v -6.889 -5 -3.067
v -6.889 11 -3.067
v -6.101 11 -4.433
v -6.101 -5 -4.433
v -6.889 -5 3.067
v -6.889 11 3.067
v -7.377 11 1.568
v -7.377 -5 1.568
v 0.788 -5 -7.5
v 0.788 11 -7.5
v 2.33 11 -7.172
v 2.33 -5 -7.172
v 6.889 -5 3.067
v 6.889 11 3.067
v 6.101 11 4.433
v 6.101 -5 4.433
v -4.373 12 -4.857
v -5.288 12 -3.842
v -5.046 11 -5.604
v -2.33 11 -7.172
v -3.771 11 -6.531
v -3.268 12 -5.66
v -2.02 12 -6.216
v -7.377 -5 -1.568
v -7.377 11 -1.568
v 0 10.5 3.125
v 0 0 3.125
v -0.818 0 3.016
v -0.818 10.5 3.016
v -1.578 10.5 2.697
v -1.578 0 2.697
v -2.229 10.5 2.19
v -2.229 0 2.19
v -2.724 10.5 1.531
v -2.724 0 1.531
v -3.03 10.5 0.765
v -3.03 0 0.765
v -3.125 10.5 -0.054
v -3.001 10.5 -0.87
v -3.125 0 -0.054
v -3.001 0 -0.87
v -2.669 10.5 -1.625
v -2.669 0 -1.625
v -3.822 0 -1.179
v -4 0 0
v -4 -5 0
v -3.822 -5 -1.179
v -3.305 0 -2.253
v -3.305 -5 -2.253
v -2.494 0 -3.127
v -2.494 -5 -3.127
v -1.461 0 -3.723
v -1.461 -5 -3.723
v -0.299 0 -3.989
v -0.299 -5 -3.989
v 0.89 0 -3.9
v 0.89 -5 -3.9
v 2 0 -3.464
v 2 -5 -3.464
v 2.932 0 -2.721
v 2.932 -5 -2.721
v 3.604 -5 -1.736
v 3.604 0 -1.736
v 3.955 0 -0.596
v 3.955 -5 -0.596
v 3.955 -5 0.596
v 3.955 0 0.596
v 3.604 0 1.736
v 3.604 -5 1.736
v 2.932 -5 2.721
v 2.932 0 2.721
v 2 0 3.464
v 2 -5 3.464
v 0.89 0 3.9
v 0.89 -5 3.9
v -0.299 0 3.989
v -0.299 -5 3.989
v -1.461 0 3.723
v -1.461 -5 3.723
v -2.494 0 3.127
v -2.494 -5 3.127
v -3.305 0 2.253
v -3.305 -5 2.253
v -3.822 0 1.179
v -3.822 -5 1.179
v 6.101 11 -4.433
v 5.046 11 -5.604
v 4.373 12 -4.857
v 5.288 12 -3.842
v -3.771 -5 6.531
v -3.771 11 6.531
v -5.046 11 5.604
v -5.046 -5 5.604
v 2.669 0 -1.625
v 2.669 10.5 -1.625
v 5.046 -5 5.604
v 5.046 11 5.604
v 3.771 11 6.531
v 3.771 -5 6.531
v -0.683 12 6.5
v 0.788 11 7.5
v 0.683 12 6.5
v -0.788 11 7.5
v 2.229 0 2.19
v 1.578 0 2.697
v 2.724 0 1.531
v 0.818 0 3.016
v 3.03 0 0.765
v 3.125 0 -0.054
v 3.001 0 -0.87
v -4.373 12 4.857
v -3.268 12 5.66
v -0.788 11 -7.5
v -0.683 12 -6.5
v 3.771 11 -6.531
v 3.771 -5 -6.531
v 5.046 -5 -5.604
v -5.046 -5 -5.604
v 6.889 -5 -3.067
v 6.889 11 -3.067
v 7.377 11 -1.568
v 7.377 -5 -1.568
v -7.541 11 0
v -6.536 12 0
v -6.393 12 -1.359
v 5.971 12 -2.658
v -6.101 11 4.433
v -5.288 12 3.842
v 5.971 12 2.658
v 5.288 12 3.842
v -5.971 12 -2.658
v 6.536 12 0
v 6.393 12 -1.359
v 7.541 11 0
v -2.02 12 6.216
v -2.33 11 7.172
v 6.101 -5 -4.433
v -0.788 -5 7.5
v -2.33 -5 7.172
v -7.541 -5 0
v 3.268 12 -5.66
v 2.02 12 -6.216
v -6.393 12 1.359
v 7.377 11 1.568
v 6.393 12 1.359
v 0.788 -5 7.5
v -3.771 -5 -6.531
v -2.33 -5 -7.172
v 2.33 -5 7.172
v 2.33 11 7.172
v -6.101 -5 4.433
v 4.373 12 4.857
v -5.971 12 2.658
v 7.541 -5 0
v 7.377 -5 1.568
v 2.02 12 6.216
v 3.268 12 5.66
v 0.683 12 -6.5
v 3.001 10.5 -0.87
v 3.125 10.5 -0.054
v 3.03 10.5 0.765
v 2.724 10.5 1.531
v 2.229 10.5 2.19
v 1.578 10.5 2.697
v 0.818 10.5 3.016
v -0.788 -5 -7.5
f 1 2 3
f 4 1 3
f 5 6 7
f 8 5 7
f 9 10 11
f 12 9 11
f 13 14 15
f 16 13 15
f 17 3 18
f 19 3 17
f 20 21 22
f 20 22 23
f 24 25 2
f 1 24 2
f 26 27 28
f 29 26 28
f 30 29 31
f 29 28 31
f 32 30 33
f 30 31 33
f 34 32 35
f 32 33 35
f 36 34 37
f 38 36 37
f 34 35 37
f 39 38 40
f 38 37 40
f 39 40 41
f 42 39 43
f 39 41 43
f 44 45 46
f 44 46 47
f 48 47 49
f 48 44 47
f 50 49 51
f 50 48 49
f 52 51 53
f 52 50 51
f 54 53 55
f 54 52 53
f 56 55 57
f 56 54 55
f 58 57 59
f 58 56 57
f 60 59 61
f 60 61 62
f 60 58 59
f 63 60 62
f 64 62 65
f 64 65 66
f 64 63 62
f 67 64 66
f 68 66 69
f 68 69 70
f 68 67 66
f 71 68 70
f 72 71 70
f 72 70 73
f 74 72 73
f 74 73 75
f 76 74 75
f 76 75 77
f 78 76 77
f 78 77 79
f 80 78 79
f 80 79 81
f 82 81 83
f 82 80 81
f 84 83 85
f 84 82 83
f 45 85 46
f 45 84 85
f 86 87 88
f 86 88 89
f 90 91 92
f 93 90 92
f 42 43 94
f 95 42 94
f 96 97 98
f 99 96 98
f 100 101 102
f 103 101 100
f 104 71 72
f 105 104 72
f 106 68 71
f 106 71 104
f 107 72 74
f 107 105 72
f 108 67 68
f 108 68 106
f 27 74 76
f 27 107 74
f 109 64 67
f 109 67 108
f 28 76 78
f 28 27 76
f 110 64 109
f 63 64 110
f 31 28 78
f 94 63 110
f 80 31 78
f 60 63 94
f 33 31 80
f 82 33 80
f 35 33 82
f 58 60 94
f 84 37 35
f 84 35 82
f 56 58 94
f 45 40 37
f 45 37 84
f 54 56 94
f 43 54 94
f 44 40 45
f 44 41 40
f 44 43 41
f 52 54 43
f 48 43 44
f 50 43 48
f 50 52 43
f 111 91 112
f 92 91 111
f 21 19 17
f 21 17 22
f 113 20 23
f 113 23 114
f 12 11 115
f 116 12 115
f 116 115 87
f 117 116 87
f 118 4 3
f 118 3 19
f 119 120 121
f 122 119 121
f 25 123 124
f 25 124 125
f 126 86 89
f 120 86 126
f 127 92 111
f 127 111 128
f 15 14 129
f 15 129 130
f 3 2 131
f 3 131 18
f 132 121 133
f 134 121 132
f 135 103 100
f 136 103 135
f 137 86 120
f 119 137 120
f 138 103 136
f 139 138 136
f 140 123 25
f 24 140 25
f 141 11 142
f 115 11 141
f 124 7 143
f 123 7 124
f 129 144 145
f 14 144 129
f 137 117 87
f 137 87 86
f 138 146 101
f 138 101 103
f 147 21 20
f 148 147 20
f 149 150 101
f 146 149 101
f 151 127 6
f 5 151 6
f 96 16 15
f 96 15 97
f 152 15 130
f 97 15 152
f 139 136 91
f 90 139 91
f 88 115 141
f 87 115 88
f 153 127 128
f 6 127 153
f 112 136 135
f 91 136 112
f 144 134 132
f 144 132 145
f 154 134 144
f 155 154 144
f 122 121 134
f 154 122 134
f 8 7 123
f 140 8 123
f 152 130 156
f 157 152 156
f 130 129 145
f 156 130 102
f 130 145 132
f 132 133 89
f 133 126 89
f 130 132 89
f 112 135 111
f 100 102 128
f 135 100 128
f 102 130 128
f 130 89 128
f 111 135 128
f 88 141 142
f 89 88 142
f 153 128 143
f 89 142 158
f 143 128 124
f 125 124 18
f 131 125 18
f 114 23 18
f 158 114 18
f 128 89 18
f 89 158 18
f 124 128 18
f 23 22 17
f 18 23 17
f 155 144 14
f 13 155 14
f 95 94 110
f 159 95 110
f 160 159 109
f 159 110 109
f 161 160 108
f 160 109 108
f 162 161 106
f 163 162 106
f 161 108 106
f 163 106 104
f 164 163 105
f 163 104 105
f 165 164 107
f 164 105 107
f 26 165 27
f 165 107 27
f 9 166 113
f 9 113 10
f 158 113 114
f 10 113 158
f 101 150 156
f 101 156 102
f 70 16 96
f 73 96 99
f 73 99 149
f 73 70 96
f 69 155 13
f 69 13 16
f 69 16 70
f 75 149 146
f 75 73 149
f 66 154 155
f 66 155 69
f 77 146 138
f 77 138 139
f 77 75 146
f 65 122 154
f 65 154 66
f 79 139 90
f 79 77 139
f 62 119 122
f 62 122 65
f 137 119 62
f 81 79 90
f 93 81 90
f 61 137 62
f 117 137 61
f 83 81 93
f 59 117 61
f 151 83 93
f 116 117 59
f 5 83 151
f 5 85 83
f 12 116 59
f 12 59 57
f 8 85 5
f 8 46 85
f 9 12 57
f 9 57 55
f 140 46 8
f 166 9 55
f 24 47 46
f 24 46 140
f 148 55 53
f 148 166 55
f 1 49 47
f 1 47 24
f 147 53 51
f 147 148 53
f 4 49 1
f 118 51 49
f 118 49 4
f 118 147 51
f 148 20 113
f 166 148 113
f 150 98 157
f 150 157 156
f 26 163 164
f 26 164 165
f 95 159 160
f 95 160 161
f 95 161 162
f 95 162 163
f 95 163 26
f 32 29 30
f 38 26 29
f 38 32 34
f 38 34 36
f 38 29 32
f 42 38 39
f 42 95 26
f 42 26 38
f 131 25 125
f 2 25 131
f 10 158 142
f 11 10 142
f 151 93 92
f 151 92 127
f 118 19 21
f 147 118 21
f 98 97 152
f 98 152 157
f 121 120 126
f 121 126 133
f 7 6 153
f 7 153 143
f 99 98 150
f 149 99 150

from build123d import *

# Parameters (mm, degrees)
BOSS_EXTRUDE1_DEPTH = 12
CUT_EXTRUDE2_DEPTH  = 10.5
BOSS_EXTRUDE2_DEPTH = 5
CHAMFER1_SIZE       = 1


with BuildPart() as part:
    # Sketch1 → Boss-Extrude1 (new body)
    with BuildSketch(Plane(origin=(0, 0, 0), x_dir=(1, 0, 0), z_dir=(0, 1, 0))):
        Polygon((-0.788281764, 7.5), (0.788281764, 7.5), (2.330393598, 7.172214011), (3.770656048, 6.530967854), (5.046122736, 5.604287062), (6.101049646, 4.432672033), (6.889331411, 3.067327967), (7.376516334, 1.567926949), (7.541312097, 0), (7.376516334, -1.567926949), (6.889331411, -3.067327967), (6.101049646, -4.432672033), (5.046122736, -5.604287062), (3.770656048, -6.530967854), (2.330393598, -7.172214011), (0.788281764, -7.5), (-0.788281764, -7.5), (-2.330393598, -7.172214011), (-3.770656048, -6.530967854), (-5.046122736, -5.604287062), (-6.101049646, -4.432672033), (-6.889331411, -3.067327967), (-7.376516334, -1.567926949), (-7.541312097, 0), (-7.376516334, 1.567926949), (-6.889331411, 3.067327967), (-6.101049646, 4.432672033), (-5.046122736, 5.604287062), (-3.770656048, 6.530967854), (-2.330393598, 7.172214011), align=None)
    extrude(amount=BOSS_EXTRUDE1_DEPTH)

    # Sketch3 → Cut-Extrude2 (cut)
    with BuildSketch(Plane(origin=(0, 0, 0), x_dir=(-1, 0, 0), z_dir=(0, -1, 0))):
        with BuildLine():
            Line((2.669269563, 1.625), (-2.669269563, 1.625))
            ThreePointArc((-2.669269563, 1.625), (-2.72431184, -1.530931089), (0, -3.125))
            ThreePointArc((0, -3.125), (2.72431184, -1.530931089), (2.669269563, 1.625))
        make_face()
    extrude(amount=-CUT_EXTRUDE2_DEPTH, mode=Mode.SUBTRACT)

    # Sketch4 → Boss-Extrude2 (add)
    with BuildSketch(Plane(origin=(0, 0, 0), x_dir=(-1, 0, 0), z_dir=(0, -1, 0))):
        Polygon((-0.788281764, 7.5), (-2.330393598, 7.172214011), (-3.770656048, 6.530967854), (-5.046122736, 5.604287062), (-6.101049646, 4.432672033), (-6.889331411, 3.067327967), (-7.376516334, 1.567926949), (-7.541312097, 0), (-7.376516334, -1.567926949), (-6.889331411, -3.067327967), (-6.101049646, -4.432672033), (-5.046122736, -5.604287062), (-3.770656048, -6.530967854), (-2.330393598, -7.172214011), (-0.788281764, -7.5), (0.788281764, -7.5), (2.330393598, -7.172214011), (3.770656048, -6.530967854), (5.046122736, -5.604287062), (6.101049646, -4.432672033), (6.889331411, -3.067327967), (7.376516334, -1.567926949), (7.541312097, 0), (7.376516334, 1.567926949), (6.889331411, 3.067327967), (6.101049646, 4.432672033), (5.046122736, 5.604287062), (3.770656048, 6.530967854), (2.330393598, 7.172214011), (0.788281764, 7.5), align=None)
        with BuildLine():
            ThreePointArc((-4, 0), (0, -4), (4, 0))
            ThreePointArc((4, 0), (0, 4), (-4, 0))
        make_face(mode=Mode.SUBTRACT)
    extrude(amount=BOSS_EXTRUDE2_DEPTH)

    # Chamfer1
    chamfer1_edges = [part.edges().sort_by_distance(p)[0] for p in [
        (7.458914215, 12, -0.783963475),
        (7.132923872, 12, -2.317627458),
        (6.495190528, 12, -3.75),
        (5.573586191, 12, -5.018479548),
        (4.408389392, 12, -6.067627458),
        (3.050524823, 12, -6.851590932),
        (-1.559337681, 12, -7.336107006),
        (-3.050524823, 12, -6.851590932),
        (-4.408389392, 12, -6.067627458),
        (-5.573586191, 12, -5.018479548),
        (-6.495190528, 12, -3.75),
        (-7.132923872, 12, -2.317627458),
        (-7.458914215, 12, -0.783963475),
        (-7.458914215, 12, 0.783963475),
        (-7.132923872, 12, 2.317627458),
        (-6.495190528, 12, 3.75),
        (1.559337681, 12, -7.336107006),
        (-5.573586191, 12, 5.018479548),
        (-4.408389392, 12, 6.067627458),
        (-3.050524823, 12, 6.851590932),
        (-1.559337681, 12, 7.336107006),
        (0, 12, 7.5),
        (1.559337681, 12, 7.336107006),
        (3.050524823, 12, 6.851590932),
        (4.408389392, 12, 6.067627458),
        (5.573586191, 12, 5.018479548),
        (6.495190528, 12, 3.75),
        (0, 12, -7.5),
        (7.132923872, 12, 2.317627458),
        (7.458914215, 12, 0.783963475),
    ]]
    chamfer(chamfer1_edges, length=CHAMFER1_SIZE)


solid = part.part
